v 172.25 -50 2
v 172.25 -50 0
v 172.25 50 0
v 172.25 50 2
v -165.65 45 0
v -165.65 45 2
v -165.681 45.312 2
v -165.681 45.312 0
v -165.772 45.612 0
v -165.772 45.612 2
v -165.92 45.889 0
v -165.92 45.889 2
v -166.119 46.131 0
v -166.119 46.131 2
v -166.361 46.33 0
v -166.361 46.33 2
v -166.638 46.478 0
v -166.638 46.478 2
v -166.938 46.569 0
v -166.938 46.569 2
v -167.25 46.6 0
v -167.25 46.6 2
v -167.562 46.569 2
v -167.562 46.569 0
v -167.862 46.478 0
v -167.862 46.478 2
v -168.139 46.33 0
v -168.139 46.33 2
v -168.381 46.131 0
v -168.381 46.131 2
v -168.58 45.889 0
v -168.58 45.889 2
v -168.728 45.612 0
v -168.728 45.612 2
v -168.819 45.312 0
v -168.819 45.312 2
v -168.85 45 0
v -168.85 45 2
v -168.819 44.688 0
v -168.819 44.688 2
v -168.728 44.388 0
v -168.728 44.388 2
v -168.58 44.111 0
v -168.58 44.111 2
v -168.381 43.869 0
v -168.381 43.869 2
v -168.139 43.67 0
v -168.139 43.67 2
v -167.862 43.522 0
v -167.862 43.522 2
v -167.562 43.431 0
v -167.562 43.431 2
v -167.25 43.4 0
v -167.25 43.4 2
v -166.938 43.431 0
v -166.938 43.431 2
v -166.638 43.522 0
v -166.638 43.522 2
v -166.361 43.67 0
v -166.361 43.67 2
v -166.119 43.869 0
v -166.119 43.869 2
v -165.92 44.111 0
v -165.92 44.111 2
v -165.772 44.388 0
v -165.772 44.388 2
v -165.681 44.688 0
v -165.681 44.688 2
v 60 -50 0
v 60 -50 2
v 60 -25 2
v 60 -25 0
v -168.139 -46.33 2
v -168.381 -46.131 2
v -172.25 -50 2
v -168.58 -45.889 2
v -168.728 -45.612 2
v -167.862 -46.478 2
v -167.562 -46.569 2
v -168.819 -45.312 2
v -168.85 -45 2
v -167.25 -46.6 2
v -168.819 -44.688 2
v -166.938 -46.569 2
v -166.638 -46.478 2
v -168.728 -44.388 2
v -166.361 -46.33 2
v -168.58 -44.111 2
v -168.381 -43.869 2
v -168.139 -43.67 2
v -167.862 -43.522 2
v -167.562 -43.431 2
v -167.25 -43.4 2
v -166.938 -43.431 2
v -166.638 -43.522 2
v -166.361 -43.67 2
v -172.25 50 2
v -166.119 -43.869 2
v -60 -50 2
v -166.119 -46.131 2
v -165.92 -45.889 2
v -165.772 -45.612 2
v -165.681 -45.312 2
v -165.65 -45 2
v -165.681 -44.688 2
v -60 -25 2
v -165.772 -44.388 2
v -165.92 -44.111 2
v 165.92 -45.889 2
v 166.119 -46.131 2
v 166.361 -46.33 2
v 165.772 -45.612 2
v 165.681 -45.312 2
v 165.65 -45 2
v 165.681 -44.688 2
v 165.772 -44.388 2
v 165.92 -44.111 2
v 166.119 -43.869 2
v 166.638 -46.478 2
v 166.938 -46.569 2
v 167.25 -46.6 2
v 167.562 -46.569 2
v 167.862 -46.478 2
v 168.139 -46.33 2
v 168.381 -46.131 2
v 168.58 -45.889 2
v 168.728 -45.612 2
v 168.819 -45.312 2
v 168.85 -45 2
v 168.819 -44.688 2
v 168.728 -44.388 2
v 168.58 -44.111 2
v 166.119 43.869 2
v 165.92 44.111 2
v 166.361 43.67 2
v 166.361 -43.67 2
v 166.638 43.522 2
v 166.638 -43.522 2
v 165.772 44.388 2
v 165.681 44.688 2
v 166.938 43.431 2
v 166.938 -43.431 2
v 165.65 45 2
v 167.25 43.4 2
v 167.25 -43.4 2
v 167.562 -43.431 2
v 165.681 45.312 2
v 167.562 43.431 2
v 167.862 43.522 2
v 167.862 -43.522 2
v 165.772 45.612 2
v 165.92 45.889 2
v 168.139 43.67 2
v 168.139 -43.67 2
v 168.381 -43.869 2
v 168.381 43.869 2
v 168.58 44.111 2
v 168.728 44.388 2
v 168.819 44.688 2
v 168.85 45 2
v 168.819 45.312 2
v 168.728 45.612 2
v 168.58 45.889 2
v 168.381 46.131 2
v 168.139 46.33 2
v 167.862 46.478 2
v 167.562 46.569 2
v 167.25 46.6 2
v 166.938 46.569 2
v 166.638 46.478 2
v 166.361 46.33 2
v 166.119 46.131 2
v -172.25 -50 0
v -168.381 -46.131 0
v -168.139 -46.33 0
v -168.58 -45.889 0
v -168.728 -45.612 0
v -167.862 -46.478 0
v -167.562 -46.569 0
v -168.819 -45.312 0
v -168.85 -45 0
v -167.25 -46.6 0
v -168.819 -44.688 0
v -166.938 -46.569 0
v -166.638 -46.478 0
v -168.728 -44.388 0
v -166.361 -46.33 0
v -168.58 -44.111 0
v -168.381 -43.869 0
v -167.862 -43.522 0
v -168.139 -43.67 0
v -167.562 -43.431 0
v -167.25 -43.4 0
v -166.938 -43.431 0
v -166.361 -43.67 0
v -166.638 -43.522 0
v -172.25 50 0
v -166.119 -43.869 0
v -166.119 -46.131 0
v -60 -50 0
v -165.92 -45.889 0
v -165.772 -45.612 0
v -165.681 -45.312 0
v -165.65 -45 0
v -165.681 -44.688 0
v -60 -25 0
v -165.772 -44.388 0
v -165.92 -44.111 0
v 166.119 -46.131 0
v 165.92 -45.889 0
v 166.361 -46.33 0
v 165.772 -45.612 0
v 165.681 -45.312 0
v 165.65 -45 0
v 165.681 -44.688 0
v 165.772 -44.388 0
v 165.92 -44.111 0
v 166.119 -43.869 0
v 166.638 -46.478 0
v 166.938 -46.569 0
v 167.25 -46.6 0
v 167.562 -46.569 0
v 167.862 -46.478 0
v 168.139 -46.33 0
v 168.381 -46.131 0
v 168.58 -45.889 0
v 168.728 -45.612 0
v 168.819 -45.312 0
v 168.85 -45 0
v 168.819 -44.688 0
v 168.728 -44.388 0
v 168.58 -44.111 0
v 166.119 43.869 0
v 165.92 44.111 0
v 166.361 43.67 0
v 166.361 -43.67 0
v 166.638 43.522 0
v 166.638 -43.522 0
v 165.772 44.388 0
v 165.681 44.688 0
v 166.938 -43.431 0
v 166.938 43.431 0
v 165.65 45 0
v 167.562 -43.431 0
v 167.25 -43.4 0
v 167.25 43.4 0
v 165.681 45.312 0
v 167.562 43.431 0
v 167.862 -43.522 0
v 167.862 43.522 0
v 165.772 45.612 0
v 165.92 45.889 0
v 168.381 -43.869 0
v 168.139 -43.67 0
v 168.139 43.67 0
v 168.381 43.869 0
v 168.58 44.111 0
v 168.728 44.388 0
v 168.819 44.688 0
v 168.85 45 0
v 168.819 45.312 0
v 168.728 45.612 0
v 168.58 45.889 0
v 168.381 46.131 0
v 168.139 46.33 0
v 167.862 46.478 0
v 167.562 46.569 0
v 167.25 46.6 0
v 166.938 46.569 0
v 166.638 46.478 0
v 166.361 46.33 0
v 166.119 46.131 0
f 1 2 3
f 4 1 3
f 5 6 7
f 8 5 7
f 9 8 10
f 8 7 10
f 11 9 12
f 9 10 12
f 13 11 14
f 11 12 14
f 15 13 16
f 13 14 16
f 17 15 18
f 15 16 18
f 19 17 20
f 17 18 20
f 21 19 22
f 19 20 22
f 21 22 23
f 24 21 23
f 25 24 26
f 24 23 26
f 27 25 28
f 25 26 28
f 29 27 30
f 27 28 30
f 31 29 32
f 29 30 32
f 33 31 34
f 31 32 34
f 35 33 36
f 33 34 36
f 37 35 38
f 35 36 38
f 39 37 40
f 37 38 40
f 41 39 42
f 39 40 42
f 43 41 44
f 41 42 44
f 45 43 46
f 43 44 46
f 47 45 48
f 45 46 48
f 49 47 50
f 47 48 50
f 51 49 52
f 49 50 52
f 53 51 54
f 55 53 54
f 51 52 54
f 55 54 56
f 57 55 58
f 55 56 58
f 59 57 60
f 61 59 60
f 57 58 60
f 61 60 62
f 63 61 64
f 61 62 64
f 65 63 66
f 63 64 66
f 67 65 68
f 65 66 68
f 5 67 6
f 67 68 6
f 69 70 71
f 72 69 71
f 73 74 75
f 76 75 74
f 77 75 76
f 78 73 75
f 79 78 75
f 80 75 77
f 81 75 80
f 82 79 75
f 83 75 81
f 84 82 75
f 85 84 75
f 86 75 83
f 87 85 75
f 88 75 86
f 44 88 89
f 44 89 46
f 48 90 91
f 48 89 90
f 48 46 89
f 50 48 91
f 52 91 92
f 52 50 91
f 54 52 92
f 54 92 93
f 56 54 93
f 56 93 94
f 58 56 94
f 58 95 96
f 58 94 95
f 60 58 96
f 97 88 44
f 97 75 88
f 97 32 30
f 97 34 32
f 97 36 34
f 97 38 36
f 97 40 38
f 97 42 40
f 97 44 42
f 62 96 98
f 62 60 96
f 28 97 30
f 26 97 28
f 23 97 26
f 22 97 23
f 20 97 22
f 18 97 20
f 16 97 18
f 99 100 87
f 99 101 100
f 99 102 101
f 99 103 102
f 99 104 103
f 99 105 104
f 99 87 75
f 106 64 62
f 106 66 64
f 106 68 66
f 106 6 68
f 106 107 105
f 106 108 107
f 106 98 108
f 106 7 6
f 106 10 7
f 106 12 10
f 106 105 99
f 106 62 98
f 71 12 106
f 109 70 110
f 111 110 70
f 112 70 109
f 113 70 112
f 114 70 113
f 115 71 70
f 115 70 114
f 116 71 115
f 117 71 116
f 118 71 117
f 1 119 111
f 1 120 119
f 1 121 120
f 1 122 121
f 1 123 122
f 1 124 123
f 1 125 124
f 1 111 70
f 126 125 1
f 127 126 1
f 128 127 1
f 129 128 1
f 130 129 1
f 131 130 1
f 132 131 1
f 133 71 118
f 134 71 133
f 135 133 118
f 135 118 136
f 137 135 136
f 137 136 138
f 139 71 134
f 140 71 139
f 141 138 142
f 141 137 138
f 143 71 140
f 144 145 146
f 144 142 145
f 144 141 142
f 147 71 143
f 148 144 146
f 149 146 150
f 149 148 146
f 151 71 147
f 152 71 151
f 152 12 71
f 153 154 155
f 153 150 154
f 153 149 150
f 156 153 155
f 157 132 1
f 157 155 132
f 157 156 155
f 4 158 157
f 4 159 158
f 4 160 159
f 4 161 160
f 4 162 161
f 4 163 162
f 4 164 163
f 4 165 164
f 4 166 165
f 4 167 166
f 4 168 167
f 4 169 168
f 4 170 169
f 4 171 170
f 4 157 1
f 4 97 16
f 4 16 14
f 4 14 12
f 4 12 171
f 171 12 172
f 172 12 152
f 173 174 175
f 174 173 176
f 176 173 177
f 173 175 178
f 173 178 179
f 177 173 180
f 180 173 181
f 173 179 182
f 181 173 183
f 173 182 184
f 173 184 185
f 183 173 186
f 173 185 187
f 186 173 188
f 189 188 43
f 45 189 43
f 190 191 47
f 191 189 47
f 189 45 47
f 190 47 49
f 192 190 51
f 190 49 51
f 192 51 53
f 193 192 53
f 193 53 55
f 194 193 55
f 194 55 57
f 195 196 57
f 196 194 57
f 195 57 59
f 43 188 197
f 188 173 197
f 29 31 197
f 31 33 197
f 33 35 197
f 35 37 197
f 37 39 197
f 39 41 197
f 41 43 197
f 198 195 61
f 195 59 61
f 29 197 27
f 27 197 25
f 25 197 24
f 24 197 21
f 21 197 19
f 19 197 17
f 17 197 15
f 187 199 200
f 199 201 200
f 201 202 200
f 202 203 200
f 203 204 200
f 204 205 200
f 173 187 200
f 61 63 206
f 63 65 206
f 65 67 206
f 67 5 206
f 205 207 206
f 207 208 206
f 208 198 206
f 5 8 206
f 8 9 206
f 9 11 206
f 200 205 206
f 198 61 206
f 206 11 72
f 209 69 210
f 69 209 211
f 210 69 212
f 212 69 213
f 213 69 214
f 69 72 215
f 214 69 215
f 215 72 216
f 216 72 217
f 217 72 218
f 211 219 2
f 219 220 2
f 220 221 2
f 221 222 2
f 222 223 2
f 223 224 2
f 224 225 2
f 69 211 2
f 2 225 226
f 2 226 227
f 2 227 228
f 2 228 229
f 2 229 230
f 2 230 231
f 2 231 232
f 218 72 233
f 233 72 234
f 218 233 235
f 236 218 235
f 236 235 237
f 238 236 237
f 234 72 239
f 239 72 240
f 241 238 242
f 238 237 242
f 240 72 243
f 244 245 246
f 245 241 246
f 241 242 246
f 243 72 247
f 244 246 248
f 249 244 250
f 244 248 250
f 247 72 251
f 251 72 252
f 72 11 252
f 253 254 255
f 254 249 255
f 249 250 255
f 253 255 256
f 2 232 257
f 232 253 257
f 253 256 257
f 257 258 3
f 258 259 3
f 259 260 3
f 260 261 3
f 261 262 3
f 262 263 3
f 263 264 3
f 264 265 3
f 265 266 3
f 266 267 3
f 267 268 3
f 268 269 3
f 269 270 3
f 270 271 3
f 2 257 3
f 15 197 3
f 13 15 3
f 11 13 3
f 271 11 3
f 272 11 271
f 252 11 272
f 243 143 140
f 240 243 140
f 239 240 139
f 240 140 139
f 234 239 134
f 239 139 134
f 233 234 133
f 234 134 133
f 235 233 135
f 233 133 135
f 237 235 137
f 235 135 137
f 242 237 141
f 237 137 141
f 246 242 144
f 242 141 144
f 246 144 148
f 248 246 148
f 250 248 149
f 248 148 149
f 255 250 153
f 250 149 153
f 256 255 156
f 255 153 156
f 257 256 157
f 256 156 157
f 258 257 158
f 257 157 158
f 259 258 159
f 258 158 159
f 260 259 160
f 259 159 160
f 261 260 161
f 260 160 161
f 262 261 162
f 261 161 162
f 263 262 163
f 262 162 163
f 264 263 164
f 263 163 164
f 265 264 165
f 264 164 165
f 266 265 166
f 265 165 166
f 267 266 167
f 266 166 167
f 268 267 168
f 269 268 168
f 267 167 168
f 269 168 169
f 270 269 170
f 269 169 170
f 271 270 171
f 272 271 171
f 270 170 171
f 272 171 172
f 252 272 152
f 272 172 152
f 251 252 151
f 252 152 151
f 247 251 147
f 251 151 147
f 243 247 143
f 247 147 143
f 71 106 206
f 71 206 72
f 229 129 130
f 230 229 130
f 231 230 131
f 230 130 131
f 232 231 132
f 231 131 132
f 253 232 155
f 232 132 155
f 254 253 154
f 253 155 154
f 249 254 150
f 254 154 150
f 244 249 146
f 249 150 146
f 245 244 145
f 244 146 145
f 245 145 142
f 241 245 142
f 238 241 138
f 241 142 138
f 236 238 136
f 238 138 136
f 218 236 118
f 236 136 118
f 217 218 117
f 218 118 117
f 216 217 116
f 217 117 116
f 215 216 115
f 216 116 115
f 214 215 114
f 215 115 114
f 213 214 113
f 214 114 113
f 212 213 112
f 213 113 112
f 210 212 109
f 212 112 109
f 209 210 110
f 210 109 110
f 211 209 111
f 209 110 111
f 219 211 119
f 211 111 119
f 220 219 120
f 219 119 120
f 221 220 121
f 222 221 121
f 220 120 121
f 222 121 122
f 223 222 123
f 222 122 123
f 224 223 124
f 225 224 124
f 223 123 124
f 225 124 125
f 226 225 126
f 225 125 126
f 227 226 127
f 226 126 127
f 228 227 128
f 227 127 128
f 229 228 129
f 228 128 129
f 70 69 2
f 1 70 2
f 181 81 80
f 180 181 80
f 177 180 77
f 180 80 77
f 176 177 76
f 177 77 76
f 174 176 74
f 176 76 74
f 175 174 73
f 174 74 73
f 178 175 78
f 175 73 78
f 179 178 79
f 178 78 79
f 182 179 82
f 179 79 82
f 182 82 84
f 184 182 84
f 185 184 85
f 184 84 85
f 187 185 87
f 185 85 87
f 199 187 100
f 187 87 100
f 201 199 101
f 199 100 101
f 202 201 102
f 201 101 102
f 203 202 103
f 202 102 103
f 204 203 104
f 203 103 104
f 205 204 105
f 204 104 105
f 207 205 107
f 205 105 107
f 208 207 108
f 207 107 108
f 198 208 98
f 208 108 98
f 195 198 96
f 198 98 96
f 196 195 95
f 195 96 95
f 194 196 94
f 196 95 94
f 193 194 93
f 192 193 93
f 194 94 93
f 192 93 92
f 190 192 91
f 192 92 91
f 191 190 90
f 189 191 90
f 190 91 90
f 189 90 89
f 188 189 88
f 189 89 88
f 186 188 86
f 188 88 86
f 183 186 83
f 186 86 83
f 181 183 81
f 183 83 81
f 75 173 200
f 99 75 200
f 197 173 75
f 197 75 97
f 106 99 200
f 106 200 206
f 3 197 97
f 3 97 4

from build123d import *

# Parameters (mm, degrees)
SKETCH_1_W          = 344.5
SKETCH_1_H          = 100
EXTRUDE_1_DEPTH     = 2
SKETCH_2_R          = 1.6
CUT_EXTRUDE_1_DEPTH = 2
SKETCH_3_W          = 120
SKETCH_3_H          = 25
CUT_EXTRUDE_2_DEPTH = 10


with BuildPart() as part:
    # 草图1 → 凸台-拉伸1 (new body)
    with BuildSketch(Plane.XY):
        Rectangle(SKETCH_1_W, SKETCH_1_H)
    extrude(amount=EXTRUDE_1_DEPTH)

    # 草图2 → 切除-拉伸1 (cut)
    with BuildSketch(Plane.XY.offset(2)):
        with Locations((167.25, -45)):
            Circle(SKETCH_2_R)
        with Locations(Location((167.25, 45, 0), (0, 0, 180))):
            Circle(SKETCH_2_R)
        with Locations(Location((-167.25, -45, 0), (0, 0, 180))):
            Circle(SKETCH_2_R)
        with Locations((-167.25, 45)):
            Circle(SKETCH_2_R)
    extrude(amount=-CUT_EXTRUDE_1_DEPTH, mode=Mode.SUBTRACT)

    # 草图3 → 切除-拉伸2 (cut)
    with BuildSketch(Plane.XY.offset(2)):
        with Locations((0, -37.5)):
            Rectangle(SKETCH_3_W, SKETCH_3_H)
    extrude(amount=-CUT_EXTRUDE_2_DEPTH, mode=Mode.SUBTRACT)


solid = part.part
